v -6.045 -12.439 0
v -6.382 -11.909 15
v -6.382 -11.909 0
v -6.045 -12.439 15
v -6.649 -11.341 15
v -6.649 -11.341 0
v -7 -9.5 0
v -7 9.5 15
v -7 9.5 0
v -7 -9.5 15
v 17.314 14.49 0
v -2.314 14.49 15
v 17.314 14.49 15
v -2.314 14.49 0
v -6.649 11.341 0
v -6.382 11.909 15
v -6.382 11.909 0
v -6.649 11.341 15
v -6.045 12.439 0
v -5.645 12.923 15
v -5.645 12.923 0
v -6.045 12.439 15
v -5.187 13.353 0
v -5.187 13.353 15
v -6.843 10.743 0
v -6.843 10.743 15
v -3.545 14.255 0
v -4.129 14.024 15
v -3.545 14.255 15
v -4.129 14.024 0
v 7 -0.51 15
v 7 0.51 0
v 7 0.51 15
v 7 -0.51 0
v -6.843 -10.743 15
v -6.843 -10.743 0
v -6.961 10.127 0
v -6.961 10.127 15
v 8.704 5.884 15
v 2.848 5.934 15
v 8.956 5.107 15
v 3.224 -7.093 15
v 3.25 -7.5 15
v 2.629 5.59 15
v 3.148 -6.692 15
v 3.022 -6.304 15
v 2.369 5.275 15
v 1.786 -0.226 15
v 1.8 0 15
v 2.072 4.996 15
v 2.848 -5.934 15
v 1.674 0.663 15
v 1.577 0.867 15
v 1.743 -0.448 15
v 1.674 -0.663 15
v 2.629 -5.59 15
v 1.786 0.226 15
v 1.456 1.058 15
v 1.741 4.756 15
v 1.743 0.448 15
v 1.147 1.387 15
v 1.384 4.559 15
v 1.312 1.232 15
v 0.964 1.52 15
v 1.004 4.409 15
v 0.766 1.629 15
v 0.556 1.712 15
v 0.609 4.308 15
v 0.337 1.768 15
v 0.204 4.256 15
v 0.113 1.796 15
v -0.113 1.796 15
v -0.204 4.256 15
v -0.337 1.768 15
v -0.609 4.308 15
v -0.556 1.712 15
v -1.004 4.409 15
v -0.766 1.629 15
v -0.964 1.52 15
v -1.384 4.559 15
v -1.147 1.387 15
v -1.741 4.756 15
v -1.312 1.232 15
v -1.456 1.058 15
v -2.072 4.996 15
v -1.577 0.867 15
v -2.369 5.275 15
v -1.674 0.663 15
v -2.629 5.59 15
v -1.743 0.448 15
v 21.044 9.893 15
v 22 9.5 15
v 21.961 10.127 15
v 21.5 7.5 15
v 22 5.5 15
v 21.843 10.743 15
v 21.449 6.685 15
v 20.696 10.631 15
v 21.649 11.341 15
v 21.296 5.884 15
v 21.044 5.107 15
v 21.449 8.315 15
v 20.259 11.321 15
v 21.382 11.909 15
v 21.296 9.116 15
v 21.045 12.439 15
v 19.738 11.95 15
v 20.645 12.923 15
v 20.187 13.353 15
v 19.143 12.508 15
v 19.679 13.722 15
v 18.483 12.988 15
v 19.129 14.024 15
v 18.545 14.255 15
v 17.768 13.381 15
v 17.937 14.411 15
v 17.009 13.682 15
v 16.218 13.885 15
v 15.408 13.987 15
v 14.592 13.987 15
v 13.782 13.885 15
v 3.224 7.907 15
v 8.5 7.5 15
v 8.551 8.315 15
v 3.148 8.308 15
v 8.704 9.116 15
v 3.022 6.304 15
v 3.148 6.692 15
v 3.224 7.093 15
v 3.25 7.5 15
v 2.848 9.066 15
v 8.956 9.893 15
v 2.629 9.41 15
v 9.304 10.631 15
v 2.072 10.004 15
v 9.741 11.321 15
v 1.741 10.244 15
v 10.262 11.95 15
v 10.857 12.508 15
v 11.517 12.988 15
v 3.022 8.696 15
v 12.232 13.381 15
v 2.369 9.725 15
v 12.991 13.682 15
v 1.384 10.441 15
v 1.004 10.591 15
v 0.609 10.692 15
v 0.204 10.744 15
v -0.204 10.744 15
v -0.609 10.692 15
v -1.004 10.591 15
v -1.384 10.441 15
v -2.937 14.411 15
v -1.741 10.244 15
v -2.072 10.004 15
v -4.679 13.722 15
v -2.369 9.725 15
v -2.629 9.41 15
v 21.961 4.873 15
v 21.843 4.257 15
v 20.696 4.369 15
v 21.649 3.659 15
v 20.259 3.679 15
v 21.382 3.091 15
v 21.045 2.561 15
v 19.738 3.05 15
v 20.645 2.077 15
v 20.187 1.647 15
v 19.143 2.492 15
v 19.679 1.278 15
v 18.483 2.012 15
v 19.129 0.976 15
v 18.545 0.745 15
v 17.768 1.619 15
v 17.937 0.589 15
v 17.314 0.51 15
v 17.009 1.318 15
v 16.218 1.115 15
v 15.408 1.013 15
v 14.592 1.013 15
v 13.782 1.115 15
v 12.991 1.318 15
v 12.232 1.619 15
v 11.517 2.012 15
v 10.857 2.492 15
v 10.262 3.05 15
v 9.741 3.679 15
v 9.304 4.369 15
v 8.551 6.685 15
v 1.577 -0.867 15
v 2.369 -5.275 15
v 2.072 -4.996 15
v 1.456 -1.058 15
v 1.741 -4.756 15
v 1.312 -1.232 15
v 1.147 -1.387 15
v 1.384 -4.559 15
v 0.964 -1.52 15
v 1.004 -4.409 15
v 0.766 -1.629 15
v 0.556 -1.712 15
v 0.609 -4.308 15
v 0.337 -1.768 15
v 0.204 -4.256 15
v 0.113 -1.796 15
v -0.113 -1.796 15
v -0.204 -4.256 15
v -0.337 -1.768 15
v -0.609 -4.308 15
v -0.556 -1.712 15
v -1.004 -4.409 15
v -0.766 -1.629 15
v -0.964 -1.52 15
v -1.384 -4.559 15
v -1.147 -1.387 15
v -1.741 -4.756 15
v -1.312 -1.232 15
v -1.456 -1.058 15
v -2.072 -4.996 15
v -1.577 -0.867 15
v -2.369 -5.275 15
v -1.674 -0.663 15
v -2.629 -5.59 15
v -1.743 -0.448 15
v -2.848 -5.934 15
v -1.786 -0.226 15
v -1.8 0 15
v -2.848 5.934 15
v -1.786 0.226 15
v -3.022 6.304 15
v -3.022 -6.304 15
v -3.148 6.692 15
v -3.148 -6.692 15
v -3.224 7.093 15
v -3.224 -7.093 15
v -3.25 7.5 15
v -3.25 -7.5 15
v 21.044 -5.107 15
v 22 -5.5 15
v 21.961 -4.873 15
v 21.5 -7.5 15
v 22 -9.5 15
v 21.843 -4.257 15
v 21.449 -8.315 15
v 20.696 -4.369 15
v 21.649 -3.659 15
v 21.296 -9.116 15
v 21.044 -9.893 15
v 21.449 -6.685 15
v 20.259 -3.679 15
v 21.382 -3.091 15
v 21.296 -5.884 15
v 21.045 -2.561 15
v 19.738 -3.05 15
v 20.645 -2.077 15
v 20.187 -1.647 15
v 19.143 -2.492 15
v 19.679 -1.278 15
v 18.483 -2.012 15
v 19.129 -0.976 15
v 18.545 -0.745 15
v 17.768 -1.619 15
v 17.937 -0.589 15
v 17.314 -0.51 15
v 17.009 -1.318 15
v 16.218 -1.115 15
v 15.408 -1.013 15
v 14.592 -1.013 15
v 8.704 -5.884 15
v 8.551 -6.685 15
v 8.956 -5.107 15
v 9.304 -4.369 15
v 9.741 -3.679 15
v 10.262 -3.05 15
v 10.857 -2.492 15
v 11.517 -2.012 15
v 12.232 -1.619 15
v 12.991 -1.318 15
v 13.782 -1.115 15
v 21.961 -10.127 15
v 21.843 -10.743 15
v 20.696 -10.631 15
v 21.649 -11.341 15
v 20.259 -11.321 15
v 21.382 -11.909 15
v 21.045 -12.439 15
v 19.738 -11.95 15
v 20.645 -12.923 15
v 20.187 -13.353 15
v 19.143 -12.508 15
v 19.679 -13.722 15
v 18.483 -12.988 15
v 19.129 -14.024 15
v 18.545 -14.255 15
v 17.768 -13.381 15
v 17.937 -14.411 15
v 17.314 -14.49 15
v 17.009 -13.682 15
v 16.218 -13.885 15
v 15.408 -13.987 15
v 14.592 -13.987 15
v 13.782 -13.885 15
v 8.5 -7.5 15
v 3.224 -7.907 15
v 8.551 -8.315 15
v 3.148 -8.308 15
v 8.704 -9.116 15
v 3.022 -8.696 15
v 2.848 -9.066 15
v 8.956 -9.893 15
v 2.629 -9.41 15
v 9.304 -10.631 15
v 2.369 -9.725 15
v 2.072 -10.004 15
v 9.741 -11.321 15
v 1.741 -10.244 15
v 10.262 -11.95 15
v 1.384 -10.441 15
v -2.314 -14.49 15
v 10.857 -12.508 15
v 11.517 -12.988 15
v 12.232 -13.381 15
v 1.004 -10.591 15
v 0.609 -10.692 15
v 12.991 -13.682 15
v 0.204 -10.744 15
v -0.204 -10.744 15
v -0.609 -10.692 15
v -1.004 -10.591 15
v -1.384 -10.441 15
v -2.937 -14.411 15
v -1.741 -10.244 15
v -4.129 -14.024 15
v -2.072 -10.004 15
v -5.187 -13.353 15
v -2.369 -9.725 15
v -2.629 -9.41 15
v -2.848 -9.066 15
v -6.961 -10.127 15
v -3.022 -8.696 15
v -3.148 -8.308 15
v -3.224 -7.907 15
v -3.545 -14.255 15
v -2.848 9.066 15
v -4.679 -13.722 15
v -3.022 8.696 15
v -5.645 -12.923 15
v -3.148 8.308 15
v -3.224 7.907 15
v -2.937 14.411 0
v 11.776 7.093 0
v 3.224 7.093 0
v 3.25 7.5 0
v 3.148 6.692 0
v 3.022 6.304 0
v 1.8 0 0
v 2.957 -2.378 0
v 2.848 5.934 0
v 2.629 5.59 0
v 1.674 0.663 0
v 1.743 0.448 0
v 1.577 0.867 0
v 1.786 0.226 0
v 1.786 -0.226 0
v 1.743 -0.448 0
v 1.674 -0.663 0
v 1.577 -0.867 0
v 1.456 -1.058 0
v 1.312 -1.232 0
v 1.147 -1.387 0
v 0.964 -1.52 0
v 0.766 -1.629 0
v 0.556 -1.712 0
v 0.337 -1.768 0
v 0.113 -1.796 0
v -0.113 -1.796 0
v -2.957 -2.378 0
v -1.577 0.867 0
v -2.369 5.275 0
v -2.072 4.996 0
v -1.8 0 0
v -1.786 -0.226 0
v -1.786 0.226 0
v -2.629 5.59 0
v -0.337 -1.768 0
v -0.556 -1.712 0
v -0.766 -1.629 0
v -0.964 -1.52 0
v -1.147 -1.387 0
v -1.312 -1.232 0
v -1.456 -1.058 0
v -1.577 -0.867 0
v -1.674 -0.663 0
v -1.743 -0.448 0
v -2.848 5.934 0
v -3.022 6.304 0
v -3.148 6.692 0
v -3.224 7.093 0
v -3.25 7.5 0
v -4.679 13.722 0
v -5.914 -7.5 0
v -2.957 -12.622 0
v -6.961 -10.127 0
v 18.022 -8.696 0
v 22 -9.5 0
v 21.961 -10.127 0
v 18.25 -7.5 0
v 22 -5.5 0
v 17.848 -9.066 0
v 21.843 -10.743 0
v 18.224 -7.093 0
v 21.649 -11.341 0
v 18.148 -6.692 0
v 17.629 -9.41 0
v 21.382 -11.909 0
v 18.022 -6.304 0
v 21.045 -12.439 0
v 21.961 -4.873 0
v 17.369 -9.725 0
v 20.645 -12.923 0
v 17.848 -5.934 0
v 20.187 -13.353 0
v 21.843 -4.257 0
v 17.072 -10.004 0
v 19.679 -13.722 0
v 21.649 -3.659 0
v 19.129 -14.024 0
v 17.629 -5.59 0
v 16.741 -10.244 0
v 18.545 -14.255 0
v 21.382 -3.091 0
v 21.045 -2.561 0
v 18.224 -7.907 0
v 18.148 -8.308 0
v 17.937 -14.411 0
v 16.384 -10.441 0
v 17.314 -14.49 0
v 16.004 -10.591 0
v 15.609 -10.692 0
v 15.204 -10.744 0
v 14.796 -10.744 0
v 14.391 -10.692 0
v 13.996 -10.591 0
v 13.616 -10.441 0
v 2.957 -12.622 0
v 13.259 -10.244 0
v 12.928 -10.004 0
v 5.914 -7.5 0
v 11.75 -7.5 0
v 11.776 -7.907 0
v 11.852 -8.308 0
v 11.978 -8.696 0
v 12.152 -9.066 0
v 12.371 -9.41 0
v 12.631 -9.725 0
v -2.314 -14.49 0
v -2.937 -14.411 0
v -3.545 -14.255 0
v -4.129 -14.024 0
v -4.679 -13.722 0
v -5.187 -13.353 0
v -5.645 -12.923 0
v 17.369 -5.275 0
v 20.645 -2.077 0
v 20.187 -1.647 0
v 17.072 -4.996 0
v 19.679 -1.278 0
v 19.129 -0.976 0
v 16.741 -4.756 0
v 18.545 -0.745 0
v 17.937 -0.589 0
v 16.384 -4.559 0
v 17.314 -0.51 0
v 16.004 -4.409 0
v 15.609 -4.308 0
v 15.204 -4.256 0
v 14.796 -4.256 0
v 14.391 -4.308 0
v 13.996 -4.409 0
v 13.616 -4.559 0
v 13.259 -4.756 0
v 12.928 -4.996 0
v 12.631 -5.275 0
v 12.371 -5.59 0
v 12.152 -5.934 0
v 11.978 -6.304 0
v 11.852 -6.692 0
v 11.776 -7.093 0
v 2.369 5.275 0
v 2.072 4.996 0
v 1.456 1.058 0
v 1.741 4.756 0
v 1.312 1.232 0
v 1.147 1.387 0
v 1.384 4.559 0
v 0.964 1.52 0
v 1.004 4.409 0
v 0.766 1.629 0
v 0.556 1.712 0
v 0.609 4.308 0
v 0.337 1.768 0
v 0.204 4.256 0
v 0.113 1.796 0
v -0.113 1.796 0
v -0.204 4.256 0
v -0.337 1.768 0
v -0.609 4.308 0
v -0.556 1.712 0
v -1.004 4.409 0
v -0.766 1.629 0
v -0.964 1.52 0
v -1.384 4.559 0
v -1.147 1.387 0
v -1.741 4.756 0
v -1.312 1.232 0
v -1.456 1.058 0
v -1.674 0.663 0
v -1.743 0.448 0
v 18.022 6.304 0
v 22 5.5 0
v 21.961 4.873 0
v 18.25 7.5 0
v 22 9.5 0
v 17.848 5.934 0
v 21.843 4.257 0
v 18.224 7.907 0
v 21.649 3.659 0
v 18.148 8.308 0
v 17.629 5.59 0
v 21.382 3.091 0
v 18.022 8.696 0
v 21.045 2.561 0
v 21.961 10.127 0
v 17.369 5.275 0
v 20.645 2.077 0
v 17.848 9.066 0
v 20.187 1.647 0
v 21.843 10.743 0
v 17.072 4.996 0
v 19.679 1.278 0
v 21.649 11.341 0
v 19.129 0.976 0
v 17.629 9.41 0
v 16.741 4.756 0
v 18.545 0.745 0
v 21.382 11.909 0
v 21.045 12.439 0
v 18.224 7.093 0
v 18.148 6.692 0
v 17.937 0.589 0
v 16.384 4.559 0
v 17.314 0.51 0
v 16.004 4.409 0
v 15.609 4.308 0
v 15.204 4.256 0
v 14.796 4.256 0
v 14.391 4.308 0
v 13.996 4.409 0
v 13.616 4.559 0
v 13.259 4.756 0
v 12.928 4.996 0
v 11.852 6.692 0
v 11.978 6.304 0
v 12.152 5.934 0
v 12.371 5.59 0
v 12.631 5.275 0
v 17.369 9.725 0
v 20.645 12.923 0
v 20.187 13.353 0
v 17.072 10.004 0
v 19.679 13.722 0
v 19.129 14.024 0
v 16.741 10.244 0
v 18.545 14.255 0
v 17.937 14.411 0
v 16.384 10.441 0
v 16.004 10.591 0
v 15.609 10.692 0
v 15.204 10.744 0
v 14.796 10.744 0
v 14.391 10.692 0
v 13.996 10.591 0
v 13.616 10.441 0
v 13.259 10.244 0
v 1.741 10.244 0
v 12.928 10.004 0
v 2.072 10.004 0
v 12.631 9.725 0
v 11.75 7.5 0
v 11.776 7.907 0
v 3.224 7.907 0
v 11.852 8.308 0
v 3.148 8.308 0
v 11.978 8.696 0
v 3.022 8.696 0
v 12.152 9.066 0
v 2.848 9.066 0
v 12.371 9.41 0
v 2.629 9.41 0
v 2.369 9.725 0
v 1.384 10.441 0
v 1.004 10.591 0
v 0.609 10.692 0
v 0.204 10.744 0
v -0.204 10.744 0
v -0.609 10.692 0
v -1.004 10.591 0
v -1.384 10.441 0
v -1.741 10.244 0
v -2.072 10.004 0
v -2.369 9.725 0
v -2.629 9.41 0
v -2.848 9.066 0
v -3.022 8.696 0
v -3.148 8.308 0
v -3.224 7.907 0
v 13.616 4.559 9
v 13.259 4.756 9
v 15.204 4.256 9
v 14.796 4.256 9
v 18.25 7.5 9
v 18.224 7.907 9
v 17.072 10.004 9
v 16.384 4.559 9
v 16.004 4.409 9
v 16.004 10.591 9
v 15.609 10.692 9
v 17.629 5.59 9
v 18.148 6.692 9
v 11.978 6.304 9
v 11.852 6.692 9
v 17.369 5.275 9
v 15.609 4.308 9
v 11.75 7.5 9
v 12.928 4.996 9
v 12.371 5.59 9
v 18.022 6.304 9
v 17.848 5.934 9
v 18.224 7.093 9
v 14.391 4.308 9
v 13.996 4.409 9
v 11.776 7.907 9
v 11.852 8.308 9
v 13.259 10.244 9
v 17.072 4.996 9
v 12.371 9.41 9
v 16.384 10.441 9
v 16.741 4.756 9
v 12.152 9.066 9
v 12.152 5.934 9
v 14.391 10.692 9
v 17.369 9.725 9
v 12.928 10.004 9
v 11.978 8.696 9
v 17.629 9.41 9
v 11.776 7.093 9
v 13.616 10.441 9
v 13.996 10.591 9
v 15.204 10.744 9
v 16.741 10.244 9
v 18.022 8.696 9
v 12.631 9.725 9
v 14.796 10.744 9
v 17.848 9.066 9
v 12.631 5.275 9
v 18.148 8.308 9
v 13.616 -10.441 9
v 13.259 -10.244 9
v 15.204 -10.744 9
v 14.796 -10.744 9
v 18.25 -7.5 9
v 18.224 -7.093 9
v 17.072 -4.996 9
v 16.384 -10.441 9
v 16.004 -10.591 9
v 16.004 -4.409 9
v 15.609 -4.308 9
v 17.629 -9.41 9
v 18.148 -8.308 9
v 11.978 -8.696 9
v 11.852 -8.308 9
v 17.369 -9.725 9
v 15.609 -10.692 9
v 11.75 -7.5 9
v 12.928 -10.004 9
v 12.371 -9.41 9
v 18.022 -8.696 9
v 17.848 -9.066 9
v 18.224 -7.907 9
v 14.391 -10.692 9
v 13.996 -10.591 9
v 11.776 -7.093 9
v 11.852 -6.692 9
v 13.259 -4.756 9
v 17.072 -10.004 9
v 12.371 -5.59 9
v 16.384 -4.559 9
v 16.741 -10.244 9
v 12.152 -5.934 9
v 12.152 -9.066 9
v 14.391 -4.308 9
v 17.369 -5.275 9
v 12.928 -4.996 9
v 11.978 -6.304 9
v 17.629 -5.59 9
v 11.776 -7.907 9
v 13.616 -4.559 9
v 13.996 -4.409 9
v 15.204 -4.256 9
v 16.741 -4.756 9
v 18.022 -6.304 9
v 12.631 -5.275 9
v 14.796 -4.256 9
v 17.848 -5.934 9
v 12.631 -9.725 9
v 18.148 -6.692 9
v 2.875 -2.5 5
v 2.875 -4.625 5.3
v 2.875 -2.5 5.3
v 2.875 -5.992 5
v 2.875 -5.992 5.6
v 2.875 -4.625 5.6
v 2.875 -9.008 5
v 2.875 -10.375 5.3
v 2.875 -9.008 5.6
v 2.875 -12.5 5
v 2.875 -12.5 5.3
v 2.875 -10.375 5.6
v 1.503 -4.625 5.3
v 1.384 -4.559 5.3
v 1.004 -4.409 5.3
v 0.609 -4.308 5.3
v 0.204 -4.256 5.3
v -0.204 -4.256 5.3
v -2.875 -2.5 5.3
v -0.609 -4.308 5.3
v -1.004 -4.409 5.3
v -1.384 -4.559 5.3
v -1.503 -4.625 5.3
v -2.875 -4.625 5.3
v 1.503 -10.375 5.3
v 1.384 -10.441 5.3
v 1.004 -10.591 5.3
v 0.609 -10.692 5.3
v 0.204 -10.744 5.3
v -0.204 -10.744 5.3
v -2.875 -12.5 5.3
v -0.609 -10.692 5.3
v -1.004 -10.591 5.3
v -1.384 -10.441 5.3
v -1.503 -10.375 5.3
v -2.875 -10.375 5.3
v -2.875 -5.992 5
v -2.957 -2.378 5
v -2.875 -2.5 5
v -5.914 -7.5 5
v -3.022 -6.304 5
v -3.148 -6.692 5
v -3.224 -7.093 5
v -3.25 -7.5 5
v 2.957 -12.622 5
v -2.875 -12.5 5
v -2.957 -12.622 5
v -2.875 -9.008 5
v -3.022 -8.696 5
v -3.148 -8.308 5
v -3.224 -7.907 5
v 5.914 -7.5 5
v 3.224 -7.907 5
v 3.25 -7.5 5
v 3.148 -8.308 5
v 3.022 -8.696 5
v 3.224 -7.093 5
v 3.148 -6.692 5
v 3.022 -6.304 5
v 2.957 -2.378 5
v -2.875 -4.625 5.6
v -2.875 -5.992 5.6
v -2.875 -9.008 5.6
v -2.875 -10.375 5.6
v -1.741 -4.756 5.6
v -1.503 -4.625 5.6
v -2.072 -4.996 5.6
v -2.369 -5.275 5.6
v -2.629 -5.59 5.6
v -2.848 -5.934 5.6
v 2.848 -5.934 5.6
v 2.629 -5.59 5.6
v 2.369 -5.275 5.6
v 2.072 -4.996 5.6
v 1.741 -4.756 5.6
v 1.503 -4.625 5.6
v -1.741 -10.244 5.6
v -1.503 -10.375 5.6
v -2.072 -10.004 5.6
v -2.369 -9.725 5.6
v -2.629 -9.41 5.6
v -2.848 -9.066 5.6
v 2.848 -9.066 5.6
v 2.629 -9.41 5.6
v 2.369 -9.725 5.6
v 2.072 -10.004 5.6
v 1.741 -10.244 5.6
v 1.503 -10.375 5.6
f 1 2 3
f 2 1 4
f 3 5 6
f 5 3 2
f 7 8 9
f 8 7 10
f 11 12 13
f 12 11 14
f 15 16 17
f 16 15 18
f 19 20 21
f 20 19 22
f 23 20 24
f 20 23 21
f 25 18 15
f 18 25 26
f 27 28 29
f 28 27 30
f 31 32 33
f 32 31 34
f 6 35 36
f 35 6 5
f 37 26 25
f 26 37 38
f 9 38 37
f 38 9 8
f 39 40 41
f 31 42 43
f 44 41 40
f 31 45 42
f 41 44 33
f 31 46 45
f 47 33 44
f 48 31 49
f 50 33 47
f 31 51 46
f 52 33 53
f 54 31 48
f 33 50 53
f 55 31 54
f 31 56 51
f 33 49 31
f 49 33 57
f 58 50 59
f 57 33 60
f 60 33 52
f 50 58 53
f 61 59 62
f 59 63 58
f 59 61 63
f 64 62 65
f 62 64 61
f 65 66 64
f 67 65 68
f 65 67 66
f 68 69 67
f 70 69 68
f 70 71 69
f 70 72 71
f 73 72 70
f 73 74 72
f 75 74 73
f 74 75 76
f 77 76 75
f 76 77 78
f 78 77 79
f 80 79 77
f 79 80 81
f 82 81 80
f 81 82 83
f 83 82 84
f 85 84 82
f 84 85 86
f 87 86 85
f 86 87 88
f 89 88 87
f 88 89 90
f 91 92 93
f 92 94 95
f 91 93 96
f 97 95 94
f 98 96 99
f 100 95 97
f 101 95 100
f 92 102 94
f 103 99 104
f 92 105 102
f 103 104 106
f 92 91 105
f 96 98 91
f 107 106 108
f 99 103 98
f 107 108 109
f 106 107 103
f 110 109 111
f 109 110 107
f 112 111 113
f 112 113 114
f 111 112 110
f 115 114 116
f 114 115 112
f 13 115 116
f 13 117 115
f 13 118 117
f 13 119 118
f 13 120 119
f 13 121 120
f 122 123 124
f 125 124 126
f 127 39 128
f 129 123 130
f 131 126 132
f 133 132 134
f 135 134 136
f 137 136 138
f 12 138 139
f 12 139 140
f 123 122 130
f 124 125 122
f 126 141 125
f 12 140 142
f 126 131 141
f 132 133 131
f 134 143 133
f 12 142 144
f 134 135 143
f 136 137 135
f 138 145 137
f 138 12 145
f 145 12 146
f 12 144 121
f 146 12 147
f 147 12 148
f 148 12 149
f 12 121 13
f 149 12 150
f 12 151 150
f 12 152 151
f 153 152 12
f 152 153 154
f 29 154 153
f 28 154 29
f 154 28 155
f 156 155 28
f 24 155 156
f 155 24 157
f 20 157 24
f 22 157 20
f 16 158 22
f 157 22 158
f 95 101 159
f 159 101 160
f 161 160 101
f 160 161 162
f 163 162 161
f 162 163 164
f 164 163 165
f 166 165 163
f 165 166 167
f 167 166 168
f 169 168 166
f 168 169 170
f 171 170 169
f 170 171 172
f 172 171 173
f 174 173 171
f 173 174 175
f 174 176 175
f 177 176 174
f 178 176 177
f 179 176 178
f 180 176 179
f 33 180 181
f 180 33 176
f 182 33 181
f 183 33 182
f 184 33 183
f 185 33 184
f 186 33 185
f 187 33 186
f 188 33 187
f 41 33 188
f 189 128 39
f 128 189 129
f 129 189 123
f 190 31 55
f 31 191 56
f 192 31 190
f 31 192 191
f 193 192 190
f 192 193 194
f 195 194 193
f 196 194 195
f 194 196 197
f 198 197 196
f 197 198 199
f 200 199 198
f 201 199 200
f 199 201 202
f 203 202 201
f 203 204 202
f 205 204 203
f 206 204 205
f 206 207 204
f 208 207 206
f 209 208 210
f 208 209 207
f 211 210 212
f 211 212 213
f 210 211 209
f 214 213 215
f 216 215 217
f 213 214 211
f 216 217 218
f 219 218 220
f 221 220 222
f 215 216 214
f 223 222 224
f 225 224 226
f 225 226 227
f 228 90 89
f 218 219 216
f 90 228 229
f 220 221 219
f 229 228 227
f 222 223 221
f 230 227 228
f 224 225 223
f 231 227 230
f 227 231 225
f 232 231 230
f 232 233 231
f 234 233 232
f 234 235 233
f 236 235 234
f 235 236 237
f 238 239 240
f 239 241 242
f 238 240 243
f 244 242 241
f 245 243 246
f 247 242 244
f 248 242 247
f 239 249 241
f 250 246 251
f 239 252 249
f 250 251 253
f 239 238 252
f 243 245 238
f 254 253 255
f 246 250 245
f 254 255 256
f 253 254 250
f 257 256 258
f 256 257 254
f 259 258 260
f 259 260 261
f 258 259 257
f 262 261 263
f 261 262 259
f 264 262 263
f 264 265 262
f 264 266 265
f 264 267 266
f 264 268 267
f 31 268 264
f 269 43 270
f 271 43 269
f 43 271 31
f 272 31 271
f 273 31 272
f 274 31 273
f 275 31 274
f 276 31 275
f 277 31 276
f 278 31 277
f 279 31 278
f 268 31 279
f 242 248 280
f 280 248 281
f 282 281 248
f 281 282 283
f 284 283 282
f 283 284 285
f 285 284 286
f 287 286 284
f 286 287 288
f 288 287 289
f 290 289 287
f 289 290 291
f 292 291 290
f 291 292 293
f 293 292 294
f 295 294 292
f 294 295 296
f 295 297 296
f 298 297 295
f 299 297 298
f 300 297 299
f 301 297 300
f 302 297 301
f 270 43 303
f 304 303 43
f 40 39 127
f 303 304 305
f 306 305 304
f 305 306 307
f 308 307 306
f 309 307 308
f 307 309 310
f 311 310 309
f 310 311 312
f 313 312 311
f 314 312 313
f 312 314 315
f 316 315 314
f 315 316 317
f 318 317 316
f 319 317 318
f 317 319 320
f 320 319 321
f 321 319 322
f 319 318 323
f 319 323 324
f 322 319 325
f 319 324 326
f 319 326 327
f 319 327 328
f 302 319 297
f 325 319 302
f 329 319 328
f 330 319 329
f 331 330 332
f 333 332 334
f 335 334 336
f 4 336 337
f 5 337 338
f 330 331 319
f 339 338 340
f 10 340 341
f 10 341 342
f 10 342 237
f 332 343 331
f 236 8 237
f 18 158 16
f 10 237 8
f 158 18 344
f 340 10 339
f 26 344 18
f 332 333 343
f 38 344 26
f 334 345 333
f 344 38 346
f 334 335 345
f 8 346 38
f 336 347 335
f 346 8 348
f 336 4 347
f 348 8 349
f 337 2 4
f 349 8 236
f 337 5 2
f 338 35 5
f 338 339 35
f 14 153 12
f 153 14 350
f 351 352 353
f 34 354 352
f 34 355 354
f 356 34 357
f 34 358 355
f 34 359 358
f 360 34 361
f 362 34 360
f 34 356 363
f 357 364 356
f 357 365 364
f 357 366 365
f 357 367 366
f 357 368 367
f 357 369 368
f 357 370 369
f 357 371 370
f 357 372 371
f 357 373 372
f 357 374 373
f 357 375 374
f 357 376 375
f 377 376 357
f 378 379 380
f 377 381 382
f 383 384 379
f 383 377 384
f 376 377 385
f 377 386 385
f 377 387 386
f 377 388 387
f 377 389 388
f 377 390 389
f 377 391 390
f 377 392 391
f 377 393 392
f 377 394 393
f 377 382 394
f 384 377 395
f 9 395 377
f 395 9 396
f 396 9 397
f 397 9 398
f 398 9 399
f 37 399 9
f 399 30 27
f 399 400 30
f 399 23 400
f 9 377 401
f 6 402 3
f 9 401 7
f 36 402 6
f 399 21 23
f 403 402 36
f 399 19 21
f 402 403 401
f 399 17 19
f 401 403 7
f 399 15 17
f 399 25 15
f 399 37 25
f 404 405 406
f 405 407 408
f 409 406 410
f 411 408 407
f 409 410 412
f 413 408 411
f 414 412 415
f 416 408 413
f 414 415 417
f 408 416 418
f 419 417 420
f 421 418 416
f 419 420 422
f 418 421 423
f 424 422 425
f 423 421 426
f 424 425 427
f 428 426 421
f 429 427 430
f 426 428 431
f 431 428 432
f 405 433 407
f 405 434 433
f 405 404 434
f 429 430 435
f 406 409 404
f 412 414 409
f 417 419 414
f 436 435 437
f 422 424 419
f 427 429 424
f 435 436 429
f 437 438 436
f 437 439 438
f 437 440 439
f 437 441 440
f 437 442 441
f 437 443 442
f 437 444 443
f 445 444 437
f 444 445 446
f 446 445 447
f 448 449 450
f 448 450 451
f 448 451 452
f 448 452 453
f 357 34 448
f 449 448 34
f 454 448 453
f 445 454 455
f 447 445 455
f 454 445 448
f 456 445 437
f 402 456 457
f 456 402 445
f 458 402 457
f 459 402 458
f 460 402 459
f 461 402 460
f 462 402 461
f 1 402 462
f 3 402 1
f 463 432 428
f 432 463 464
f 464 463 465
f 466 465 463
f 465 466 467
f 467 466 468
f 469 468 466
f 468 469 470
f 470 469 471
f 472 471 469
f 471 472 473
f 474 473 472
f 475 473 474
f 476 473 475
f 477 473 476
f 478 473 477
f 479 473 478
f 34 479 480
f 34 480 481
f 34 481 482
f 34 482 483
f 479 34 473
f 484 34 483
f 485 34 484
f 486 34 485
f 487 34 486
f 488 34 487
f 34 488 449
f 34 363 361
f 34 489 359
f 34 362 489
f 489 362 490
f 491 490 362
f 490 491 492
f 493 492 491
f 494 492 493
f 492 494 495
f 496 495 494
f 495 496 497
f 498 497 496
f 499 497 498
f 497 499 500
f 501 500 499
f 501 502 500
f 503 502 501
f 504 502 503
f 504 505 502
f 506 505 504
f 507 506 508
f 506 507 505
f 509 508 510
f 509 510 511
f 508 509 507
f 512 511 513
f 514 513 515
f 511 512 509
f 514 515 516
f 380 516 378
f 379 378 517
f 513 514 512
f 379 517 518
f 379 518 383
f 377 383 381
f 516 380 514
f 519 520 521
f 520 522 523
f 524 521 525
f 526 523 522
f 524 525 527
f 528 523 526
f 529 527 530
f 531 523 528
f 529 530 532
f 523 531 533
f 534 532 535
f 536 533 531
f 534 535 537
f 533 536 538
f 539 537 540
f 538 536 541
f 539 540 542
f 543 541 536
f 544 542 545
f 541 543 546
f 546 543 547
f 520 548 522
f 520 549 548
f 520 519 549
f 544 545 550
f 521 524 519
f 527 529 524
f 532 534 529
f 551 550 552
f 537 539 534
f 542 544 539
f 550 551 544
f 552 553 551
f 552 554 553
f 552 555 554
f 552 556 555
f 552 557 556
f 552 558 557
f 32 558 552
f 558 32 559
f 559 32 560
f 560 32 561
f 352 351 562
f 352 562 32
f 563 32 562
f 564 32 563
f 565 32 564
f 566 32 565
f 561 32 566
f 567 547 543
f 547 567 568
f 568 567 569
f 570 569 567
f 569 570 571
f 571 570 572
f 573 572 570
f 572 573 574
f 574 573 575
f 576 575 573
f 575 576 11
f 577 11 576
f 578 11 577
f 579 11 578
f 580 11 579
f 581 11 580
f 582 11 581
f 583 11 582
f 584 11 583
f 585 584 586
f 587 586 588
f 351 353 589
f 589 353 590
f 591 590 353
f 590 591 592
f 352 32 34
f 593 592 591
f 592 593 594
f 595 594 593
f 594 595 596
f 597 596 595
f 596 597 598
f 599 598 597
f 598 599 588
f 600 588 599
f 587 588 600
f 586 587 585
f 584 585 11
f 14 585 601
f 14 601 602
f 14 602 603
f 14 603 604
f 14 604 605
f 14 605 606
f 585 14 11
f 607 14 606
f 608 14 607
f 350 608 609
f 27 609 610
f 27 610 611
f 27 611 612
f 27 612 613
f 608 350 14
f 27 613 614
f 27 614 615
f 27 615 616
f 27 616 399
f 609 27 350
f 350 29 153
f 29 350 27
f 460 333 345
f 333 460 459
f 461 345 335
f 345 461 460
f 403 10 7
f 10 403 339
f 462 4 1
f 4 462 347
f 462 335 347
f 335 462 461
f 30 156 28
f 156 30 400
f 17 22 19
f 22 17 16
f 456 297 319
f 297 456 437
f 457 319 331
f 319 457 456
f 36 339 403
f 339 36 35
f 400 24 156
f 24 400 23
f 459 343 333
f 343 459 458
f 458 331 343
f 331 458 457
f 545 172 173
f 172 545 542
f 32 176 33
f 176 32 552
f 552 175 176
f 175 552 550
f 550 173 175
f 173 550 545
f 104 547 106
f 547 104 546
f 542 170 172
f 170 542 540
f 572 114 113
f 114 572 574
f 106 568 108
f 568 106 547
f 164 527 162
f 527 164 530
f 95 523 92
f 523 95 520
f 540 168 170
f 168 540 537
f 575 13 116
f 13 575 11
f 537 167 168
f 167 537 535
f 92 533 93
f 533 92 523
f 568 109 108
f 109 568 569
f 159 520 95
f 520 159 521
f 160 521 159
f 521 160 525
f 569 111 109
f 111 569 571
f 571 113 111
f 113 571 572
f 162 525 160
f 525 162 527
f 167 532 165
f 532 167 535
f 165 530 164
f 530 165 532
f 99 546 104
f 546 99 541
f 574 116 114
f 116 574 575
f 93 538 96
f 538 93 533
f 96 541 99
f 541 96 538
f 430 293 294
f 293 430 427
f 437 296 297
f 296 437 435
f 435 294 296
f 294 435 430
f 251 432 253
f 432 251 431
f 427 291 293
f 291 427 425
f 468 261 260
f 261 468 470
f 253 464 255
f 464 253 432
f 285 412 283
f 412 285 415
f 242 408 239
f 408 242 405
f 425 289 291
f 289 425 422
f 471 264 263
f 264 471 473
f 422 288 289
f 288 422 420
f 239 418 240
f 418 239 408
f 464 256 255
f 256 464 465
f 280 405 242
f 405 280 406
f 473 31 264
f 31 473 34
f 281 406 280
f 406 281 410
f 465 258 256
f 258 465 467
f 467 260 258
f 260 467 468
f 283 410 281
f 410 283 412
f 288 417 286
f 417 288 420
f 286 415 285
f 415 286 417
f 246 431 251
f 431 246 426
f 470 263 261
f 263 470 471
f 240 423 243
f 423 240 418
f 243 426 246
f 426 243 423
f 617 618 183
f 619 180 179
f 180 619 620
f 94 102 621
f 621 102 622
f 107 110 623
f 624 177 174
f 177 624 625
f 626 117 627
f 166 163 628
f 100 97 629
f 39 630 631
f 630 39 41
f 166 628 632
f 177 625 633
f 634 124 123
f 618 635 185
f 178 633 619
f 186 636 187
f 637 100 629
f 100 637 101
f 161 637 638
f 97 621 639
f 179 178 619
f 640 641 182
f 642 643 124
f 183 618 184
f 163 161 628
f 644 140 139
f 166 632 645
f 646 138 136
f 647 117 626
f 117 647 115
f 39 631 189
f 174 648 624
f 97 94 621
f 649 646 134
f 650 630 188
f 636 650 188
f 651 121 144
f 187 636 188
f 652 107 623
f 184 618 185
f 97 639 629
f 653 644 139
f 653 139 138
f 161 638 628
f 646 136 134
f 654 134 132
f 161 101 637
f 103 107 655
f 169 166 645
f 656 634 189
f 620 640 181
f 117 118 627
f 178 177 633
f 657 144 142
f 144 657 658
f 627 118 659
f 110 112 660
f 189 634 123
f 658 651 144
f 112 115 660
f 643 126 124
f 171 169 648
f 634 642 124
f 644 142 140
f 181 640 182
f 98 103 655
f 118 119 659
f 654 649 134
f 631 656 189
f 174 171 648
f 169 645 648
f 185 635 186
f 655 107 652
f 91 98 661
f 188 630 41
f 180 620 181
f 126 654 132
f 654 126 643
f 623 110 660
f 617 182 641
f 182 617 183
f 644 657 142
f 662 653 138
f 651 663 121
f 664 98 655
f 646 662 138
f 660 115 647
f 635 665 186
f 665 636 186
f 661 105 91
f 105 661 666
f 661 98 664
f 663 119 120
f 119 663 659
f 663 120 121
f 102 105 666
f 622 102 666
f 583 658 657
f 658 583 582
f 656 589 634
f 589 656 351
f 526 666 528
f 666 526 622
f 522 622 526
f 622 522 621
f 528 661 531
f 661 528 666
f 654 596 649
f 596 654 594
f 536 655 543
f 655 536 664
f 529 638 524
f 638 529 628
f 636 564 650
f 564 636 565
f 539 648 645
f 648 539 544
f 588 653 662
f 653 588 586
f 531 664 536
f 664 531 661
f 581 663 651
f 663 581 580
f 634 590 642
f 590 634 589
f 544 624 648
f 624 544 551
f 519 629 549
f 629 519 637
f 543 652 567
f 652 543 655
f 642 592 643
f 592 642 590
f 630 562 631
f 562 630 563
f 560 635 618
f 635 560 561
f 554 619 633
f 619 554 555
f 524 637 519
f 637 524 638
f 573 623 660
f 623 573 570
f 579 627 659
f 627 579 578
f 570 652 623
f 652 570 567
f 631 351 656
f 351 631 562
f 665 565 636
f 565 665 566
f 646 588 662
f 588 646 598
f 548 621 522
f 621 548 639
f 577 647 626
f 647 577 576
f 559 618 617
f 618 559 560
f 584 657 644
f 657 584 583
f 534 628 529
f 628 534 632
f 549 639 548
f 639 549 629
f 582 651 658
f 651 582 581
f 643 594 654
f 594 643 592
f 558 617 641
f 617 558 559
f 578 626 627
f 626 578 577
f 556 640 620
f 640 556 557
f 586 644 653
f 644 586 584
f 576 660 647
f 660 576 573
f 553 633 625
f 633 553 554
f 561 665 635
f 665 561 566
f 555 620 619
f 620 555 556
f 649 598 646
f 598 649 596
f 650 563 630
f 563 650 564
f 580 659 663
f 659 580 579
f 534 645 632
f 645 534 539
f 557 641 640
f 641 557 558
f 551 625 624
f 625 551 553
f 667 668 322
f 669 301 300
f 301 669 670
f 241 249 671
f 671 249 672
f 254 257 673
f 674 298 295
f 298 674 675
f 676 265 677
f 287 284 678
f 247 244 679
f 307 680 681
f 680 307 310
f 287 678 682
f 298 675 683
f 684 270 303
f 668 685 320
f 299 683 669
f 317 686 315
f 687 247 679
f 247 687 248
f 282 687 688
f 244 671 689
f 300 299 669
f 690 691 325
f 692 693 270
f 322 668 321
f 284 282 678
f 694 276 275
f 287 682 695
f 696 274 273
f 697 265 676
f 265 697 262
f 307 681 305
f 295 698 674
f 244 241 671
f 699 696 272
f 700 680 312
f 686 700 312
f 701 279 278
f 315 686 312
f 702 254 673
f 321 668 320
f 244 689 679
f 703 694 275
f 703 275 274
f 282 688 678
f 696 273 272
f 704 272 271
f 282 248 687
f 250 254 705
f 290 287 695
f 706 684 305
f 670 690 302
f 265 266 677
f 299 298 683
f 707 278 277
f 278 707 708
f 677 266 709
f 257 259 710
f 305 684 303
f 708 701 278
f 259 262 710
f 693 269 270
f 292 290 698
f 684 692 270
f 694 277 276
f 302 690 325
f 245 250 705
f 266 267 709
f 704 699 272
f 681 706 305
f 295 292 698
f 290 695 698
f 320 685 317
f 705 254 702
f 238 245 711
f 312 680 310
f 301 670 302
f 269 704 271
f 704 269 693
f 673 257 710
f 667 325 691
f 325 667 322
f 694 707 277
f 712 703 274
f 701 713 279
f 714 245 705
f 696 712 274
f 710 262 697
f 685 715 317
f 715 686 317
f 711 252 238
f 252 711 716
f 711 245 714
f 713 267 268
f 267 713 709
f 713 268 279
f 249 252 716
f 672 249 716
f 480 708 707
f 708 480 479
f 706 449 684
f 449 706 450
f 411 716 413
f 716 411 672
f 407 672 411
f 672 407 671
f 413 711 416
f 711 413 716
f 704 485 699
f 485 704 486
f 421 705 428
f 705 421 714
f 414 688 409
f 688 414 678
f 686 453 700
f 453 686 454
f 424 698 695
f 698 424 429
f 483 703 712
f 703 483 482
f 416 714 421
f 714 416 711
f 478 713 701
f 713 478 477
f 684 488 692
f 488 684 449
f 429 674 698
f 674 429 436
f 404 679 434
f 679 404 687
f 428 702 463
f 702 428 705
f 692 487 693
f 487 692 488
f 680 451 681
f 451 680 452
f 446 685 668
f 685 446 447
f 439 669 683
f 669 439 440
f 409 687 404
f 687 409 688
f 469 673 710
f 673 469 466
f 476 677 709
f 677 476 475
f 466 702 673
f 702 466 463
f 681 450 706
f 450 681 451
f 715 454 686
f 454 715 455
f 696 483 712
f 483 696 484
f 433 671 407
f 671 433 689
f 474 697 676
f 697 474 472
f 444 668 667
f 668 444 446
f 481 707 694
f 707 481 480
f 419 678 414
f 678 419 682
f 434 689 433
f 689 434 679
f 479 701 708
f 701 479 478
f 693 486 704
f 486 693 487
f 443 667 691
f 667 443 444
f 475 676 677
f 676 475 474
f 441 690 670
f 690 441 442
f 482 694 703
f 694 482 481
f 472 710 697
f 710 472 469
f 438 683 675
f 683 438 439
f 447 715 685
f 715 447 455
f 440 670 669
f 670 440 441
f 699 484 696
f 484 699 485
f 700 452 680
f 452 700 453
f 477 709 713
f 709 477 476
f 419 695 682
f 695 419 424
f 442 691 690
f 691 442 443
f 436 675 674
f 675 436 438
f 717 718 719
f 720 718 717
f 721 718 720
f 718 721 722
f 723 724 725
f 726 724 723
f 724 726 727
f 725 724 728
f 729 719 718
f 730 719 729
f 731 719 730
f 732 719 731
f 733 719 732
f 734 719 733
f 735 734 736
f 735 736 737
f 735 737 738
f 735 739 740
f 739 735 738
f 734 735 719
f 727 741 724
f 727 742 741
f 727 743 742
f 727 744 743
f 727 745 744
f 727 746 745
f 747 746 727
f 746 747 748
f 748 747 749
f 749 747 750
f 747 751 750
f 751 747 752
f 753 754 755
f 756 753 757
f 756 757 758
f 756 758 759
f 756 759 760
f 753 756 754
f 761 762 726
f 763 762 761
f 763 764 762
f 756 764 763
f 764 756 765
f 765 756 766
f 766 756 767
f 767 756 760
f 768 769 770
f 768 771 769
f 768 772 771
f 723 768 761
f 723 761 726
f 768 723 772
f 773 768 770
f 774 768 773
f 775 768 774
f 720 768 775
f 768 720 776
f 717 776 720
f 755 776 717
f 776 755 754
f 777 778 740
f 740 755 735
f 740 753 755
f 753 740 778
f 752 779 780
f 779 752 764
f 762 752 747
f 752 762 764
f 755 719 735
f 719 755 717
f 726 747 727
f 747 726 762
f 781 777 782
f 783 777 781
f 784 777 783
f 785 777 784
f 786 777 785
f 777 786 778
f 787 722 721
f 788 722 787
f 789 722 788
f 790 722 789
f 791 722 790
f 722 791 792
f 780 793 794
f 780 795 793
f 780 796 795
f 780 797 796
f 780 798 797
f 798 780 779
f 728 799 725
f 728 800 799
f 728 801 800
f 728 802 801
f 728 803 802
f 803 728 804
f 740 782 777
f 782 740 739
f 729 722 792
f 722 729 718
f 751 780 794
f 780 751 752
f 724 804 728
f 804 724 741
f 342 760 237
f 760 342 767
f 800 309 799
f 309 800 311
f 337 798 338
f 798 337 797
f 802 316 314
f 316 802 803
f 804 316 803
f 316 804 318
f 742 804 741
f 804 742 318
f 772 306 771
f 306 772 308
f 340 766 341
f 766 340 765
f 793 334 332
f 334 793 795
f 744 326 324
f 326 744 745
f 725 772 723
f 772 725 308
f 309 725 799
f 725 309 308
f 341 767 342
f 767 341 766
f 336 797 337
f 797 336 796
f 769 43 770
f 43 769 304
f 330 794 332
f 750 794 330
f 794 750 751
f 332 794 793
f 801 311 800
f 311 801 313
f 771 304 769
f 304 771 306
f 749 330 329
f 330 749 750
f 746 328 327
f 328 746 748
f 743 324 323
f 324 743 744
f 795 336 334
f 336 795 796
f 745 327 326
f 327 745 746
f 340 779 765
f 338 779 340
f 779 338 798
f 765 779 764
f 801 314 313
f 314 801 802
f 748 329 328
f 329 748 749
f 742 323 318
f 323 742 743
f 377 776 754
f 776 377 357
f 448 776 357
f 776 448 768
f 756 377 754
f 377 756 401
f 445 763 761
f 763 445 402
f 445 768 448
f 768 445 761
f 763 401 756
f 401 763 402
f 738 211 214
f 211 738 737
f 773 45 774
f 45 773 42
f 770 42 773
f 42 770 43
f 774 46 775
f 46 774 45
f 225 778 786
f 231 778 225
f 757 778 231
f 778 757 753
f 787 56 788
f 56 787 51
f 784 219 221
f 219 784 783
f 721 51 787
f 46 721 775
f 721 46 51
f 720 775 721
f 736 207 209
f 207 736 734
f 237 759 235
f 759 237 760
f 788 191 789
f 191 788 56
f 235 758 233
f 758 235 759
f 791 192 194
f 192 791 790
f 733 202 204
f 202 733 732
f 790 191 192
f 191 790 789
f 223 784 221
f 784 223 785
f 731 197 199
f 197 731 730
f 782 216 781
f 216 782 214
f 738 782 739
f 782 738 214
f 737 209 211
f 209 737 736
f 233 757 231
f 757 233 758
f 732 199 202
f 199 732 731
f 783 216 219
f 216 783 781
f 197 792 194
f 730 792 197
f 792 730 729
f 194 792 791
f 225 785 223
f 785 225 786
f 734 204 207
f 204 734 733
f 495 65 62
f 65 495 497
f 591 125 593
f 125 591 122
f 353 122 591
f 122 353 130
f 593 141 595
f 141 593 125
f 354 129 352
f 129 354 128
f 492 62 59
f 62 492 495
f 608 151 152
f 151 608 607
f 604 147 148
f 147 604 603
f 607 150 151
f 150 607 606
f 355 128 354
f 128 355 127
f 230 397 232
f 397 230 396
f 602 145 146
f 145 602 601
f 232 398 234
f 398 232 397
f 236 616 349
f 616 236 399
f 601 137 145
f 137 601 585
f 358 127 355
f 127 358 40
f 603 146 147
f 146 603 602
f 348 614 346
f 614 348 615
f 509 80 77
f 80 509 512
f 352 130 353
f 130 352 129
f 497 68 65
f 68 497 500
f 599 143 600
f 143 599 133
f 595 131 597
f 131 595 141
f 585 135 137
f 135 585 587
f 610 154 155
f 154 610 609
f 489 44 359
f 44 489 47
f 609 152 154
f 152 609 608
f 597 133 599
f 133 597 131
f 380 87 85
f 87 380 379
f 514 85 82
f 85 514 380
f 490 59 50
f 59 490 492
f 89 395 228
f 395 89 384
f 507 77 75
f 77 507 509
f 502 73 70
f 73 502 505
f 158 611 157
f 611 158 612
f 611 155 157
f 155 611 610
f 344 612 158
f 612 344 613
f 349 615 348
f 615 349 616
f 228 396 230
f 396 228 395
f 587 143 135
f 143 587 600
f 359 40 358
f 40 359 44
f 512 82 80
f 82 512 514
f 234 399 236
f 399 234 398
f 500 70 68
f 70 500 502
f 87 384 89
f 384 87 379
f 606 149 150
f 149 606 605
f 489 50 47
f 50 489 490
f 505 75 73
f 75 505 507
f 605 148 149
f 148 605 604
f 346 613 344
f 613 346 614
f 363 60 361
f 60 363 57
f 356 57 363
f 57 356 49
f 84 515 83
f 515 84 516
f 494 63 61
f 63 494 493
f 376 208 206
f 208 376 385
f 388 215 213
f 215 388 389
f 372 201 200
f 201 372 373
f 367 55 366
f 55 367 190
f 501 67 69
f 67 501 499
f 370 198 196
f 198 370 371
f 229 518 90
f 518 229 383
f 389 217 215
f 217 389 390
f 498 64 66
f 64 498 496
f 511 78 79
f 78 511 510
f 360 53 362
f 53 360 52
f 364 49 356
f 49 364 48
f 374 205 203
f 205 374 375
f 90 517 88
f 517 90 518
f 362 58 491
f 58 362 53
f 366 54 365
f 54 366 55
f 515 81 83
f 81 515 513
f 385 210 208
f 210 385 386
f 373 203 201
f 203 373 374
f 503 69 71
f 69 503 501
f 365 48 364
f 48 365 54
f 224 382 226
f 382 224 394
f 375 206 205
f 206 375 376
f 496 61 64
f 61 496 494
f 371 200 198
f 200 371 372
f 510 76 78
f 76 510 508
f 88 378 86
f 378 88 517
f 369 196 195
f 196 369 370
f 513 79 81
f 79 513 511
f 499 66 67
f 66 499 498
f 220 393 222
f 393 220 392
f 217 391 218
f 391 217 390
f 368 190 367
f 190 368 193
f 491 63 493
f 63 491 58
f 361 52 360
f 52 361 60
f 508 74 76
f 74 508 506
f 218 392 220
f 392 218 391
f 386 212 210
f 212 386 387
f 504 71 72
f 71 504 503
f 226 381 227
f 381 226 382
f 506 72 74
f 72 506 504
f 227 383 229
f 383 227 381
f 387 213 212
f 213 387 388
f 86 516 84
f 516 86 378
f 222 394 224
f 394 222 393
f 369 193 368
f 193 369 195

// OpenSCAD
$fn = 50;


difference() {
	union() {
		hull() {
			translate(v = [-2.0000000000, 9.5000000000, 0]) {
				cylinder(h = 15, r = 5);
			}
			translate(v = [2.0000000000, 9.5000000000, 0]) {
				cylinder(h = 15, r = 5);
			}
			translate(v = [-2.0000000000, -9.5000000000, 0]) {
				cylinder(h = 15, r = 5);
			}
			translate(v = [2.0000000000, -9.5000000000, 0]) {
				cylinder(h = 15, r = 5);
			}
		}
		translate(v = [7.5000000000, 7.5000000000, 0]) {
			hull() {
				translate(v = [-9.5000000000, 2.0000000000, 0]) {
					cylinder(h = 15, r = 5);
				}
				translate(v = [9.5000000000, 2.0000000000, 0]) {
					cylinder(h = 15, r = 5);
				}
				translate(v = [-9.5000000000, -2.0000000000, 0]) {
					cylinder(h = 15, r = 5);
				}
				translate(v = [9.5000000000, -2.0000000000, 0]) {
					cylinder(h = 15, r = 5);
				}
			}
		}
		translate(v = [7.5000000000, -7.5000000000, 0]) {
			hull() {
				translate(v = [-9.5000000000, 2.0000000000, 0]) {
					cylinder(h = 15, r = 5);
				}
				translate(v = [9.5000000000, 2.0000000000, 0]) {
					cylinder(h = 15, r = 5);
				}
				translate(v = [-9.5000000000, -2.0000000000, 0]) {
					cylinder(h = 15, r = 5);
				}
				translate(v = [9.5000000000, -2.0000000000, 0]) {
					cylinder(h = 15, r = 5);
				}
			}
		}
	}
	union() {
		translate(v = [15.0000000000, 7.5000000000, 15]) {
			rotate(a = [0, 0, 0]) {
				difference() {
					union() {
						#translate(v = [0, 0, -15.0000000000]) {
							cylinder(h = 15, r = 2.2500000000);
						}
						#translate(v = [0, 0, -6]) {
							cylinder(h = 6, r1 = 3.2500000000, r2 = 6.5000000000);
						}
						#translate(v = [0, 0, -15.0000000000]) {
							cylinder(h = 15, r = 3.2500000000);
						}
						#translate(v = [0, 0, -15.0000000000]) {
							cylinder(h = 15, r = 2.2500000000);
						}
					}
					union();
				}
			}
		}
		translate(v = [15.0000000000, -7.5000000000, 15]) {
			rotate(a = [0, 0, 0]) {
				difference() {
					union() {
						#translate(v = [0, 0, -15.0000000000]) {
							cylinder(h = 15, r = 2.2500000000);
						}
						#translate(v = [0, 0, -6]) {
							cylinder(h = 6, r1 = 3.2500000000, r2 = 6.5000000000);
						}
						#translate(v = [0, 0, -15.0000000000]) {
							cylinder(h = 15, r = 3.2500000000);
						}
						#translate(v = [0, 0, -15.0000000000]) {
							cylinder(h = 15, r = 2.2500000000);
						}
					}
					union();
				}
			}
		}
		translate(v = [0.0000000000, -7.5000000000, 0]) {
			rotate(a = [0, 0, 0]) {
				difference() {
					union() {
						#translate(v = [-2.8750000000, -5.0000000000, -0.3000000000]) {
							cube(size = [5.7500000000, 10, 0.3000000000]);
						}
						#translate(v = [-2.8750000000, -2.8750000000, -0.6000000000]) {
							cube(size = [5.7500000000, 5.7500000000, 0.3000000000]);
						}
						#translate(v = [-2.8750000000, -5.0000000000, 5]) {
							cube(size = [5.7500000000, 10, 0.3000000000]);
						}
						#translate(v = [-2.8750000000, -2.8750000000, 5.3000000000]) {
							cube(size = [5.7500000000, 5.7500000000, 0.3000000000]);
						}
						#translate(v = [0, 0, -100.0000000000]) {
							cylinder(h = 200, r = 3.2500000000);
						}
						#linear_extrude(height = 5) {
							polygon(points = [[5.9142500000, 0.0000000000], [2.9571250000, 5.1218907443], [-2.9571250000, 5.1218907443], [-5.9142500000, 0.0000000000], [-2.9571250000, -5.1218907443], [2.9571250000, -5.1218907443]]);
						}
						#translate(v = [-2.8750000000, -5.0000000000, -0.3000000000]) {
							cube(size = [5.7500000000, 10, 0.3000000000]);
						}
						#translate(v = [-2.8750000000, -2.8750000000, -0.6000000000]) {
							cube(size = [5.7500000000, 5.7500000000, 0.3000000000]);
						}
						#translate(v = [-2.8750000000, -5.0000000000, 5]) {
							cube(size = [5.7500000000, 10, 0.3000000000]);
						}
						#translate(v = [-2.8750000000, -2.8750000000, 5.3000000000]) {
							cube(size = [5.7500000000, 5.7500000000, 0.3000000000]);
						}
						#translate(v = [0, 0, -100.0000000000]) {
							cylinder(h = 200, r = 3.2500000000);
						}
						#translate(v = [-2.8750000000, -5.0000000000, -0.3000000000]) {
							cube(size = [5.7500000000, 10, 0.3000000000]);
						}
						#translate(v = [-2.8750000000, -2.8750000000, -0.6000000000]) {
							cube(size = [5.7500000000, 5.7500000000, 0.3000000000]);
						}
						#translate(v = [-2.8750000000, -5.0000000000, 5]) {
							cube(size = [5.7500000000, 10, 0.3000000000]);
						}
						#translate(v = [-2.8750000000, -2.8750000000, 5.3000000000]) {
							cube(size = [5.7500000000, 5.7500000000, 0.3000000000]);
						}
						#translate(v = [0, 0, -100.0000000000]) {
							cylinder(h = 200, r = 3.2500000000);
						}
					}
					union();
				}
			}
		}
		translate(v = [0.0000000000, -7.5000000000, 0]) {
			translate(v = [0, 0, -100]) {
				cylinder(h = 200, r = 3.2500000000);
			}
		}
		translate(v = [0.0000000000, 7.5000000000, 0]) {
			translate(v = [0, 0, -100]) {
				cylinder(h = 200, r = 3.2500000000);
			}
		}
		translate(v = [0.0000000000, -7.5000000000, 0]) {
			translate(v = [0, 0, -100]) {
				cylinder(h = 200, r = 1.8000000000);
			}
		}
		translate(v = [0, 0, -100]) {
			cylinder(h = 200, r = 1.8000000000);
		}
		translate(v = [0.0000000000, 7.5000000000, 0]) {
			translate(v = [0, 0, -100]) {
				cylinder(h = 200, r = 1.8000000000);
			}
		}
	}
}
